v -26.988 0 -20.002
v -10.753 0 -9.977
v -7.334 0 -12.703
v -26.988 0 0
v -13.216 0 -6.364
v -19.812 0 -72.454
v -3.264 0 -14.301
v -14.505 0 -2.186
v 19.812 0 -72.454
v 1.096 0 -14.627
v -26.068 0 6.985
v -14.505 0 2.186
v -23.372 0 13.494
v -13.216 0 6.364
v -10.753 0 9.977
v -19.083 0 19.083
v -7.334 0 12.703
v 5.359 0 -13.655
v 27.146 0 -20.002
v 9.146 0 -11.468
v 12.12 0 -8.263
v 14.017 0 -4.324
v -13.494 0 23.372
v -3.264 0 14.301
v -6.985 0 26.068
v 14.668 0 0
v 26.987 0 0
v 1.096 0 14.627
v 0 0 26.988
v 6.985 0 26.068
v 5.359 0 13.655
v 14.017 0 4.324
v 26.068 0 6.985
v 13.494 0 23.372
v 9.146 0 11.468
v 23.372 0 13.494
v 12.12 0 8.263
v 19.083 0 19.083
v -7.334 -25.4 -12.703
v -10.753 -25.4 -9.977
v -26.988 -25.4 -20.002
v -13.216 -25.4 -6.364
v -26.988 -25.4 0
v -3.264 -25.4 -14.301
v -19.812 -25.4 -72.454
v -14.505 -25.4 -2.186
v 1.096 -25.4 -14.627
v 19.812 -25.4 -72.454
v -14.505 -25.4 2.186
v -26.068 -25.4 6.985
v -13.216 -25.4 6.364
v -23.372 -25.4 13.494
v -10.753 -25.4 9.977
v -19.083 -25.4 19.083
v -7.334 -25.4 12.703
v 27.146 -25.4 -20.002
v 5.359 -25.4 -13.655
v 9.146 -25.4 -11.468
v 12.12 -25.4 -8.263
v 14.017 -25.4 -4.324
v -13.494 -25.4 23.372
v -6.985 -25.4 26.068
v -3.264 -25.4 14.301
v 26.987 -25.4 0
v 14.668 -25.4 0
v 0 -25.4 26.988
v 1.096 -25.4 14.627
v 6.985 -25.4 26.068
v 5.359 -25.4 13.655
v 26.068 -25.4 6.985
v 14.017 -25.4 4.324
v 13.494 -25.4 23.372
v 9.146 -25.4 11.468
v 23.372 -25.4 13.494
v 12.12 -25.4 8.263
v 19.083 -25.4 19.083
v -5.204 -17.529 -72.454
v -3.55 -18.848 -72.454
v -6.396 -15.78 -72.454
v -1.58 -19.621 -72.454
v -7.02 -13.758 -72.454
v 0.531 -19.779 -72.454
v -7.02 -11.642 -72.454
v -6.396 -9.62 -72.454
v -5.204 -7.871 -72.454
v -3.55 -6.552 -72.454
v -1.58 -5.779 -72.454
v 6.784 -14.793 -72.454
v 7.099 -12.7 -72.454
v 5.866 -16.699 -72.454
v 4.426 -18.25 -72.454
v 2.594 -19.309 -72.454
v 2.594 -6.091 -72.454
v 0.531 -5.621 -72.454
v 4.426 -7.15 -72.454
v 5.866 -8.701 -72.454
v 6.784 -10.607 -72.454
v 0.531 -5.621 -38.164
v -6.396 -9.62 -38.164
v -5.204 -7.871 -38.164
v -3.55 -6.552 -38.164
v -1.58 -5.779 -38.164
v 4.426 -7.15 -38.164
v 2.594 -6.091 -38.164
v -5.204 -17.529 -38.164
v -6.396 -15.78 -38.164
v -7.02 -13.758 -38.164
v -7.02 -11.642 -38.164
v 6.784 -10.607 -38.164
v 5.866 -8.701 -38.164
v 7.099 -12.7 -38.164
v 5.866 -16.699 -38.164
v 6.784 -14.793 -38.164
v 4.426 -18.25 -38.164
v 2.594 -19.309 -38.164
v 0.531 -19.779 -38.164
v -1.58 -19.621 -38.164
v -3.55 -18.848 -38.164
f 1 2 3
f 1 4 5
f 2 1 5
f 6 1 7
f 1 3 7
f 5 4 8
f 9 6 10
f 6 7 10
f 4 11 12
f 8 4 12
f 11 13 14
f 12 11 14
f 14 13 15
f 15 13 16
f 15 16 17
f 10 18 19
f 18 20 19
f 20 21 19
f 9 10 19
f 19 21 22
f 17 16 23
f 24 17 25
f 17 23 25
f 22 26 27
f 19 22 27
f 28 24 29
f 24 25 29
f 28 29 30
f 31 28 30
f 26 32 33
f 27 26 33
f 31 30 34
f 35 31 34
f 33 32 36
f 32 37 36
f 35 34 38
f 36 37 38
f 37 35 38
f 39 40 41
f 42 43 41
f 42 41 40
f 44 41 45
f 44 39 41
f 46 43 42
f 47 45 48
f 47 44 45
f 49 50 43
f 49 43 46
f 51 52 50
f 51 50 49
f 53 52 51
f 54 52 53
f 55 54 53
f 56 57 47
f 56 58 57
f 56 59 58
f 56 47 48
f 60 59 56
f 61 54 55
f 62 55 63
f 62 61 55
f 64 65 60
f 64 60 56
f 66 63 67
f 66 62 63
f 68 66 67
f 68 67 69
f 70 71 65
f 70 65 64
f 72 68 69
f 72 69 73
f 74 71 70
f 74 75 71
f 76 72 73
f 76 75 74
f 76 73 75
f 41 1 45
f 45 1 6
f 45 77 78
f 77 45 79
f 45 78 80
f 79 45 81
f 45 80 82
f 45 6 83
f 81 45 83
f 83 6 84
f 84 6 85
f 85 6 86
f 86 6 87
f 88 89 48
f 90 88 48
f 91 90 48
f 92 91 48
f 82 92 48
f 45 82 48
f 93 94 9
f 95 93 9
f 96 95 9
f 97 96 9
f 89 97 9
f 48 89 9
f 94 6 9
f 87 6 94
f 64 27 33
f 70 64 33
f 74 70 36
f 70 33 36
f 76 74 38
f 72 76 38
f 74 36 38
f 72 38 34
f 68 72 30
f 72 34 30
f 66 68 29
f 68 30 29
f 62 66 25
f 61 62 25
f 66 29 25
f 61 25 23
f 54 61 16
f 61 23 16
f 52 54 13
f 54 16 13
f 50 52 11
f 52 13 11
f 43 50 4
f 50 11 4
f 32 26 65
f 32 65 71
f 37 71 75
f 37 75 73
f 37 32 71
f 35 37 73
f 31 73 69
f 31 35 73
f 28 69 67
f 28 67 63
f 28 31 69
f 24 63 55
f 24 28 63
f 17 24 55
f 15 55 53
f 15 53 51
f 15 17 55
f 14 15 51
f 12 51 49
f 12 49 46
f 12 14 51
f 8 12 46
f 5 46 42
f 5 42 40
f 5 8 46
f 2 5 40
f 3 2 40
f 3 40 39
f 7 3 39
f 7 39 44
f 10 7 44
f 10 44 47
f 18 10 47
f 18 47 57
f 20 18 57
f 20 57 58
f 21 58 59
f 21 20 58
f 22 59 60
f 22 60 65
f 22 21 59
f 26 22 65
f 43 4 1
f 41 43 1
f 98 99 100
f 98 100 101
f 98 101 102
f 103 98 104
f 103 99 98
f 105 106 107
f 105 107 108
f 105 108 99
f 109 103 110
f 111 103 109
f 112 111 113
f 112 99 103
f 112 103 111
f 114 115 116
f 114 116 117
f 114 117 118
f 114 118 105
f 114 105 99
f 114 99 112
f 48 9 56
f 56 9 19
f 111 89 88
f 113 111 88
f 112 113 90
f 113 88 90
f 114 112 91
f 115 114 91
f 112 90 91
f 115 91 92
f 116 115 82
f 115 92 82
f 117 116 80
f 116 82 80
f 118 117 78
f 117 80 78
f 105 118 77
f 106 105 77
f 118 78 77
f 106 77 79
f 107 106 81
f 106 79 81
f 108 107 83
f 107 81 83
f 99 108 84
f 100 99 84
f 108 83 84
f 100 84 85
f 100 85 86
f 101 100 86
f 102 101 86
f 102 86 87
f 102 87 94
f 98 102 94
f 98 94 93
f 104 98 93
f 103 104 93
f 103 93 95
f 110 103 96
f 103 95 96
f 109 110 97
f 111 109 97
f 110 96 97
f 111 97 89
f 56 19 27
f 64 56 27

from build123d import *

# Parameters (mm, degrees)
F0_R     = 14.6685
F1_DEPTH = 25.4
F2_R     = 7.0993
F3_DEPTH = 34.29


with BuildPart() as f1:
    # F0 (on Front) → F1 (new body)
    with BuildSketch(Plane.XZ):
        with BuildLine():
            Line((-19.812, -72.4535), (0, -72.4535))
            Line((0, -72.4535), (19.812, -72.4535))
            Line((19.812, -72.4535), (27.146323, -20.0025))
            Line((27.146323, -20.0025), (26.9875, 0))
            ThreePointArc((26.9875, 0), (0, 26.9875), (-26.9875, 0))
            Line((-26.9875, 0), (-26.9875, -20.0025))
            Line((-26.9875, -20.0025), (-19.812, -72.4535))
        make_face()
        Circle(F0_R, mode=Mode.SUBTRACT)
    extrude(amount=F1_DEPTH)

    # F2 (on face) → F3 (cut)
    with BuildSketch(Plane(origin=(0, 0, -72.4535), x_dir=(1, 0, 0), z_dir=(0, 0, -1))):
        with Locations((0, 12.7)):
            Circle(F2_R)
    extrude(amount=-F3_DEPTH, mode=Mode.SUBTRACT)


solid = f1.part
